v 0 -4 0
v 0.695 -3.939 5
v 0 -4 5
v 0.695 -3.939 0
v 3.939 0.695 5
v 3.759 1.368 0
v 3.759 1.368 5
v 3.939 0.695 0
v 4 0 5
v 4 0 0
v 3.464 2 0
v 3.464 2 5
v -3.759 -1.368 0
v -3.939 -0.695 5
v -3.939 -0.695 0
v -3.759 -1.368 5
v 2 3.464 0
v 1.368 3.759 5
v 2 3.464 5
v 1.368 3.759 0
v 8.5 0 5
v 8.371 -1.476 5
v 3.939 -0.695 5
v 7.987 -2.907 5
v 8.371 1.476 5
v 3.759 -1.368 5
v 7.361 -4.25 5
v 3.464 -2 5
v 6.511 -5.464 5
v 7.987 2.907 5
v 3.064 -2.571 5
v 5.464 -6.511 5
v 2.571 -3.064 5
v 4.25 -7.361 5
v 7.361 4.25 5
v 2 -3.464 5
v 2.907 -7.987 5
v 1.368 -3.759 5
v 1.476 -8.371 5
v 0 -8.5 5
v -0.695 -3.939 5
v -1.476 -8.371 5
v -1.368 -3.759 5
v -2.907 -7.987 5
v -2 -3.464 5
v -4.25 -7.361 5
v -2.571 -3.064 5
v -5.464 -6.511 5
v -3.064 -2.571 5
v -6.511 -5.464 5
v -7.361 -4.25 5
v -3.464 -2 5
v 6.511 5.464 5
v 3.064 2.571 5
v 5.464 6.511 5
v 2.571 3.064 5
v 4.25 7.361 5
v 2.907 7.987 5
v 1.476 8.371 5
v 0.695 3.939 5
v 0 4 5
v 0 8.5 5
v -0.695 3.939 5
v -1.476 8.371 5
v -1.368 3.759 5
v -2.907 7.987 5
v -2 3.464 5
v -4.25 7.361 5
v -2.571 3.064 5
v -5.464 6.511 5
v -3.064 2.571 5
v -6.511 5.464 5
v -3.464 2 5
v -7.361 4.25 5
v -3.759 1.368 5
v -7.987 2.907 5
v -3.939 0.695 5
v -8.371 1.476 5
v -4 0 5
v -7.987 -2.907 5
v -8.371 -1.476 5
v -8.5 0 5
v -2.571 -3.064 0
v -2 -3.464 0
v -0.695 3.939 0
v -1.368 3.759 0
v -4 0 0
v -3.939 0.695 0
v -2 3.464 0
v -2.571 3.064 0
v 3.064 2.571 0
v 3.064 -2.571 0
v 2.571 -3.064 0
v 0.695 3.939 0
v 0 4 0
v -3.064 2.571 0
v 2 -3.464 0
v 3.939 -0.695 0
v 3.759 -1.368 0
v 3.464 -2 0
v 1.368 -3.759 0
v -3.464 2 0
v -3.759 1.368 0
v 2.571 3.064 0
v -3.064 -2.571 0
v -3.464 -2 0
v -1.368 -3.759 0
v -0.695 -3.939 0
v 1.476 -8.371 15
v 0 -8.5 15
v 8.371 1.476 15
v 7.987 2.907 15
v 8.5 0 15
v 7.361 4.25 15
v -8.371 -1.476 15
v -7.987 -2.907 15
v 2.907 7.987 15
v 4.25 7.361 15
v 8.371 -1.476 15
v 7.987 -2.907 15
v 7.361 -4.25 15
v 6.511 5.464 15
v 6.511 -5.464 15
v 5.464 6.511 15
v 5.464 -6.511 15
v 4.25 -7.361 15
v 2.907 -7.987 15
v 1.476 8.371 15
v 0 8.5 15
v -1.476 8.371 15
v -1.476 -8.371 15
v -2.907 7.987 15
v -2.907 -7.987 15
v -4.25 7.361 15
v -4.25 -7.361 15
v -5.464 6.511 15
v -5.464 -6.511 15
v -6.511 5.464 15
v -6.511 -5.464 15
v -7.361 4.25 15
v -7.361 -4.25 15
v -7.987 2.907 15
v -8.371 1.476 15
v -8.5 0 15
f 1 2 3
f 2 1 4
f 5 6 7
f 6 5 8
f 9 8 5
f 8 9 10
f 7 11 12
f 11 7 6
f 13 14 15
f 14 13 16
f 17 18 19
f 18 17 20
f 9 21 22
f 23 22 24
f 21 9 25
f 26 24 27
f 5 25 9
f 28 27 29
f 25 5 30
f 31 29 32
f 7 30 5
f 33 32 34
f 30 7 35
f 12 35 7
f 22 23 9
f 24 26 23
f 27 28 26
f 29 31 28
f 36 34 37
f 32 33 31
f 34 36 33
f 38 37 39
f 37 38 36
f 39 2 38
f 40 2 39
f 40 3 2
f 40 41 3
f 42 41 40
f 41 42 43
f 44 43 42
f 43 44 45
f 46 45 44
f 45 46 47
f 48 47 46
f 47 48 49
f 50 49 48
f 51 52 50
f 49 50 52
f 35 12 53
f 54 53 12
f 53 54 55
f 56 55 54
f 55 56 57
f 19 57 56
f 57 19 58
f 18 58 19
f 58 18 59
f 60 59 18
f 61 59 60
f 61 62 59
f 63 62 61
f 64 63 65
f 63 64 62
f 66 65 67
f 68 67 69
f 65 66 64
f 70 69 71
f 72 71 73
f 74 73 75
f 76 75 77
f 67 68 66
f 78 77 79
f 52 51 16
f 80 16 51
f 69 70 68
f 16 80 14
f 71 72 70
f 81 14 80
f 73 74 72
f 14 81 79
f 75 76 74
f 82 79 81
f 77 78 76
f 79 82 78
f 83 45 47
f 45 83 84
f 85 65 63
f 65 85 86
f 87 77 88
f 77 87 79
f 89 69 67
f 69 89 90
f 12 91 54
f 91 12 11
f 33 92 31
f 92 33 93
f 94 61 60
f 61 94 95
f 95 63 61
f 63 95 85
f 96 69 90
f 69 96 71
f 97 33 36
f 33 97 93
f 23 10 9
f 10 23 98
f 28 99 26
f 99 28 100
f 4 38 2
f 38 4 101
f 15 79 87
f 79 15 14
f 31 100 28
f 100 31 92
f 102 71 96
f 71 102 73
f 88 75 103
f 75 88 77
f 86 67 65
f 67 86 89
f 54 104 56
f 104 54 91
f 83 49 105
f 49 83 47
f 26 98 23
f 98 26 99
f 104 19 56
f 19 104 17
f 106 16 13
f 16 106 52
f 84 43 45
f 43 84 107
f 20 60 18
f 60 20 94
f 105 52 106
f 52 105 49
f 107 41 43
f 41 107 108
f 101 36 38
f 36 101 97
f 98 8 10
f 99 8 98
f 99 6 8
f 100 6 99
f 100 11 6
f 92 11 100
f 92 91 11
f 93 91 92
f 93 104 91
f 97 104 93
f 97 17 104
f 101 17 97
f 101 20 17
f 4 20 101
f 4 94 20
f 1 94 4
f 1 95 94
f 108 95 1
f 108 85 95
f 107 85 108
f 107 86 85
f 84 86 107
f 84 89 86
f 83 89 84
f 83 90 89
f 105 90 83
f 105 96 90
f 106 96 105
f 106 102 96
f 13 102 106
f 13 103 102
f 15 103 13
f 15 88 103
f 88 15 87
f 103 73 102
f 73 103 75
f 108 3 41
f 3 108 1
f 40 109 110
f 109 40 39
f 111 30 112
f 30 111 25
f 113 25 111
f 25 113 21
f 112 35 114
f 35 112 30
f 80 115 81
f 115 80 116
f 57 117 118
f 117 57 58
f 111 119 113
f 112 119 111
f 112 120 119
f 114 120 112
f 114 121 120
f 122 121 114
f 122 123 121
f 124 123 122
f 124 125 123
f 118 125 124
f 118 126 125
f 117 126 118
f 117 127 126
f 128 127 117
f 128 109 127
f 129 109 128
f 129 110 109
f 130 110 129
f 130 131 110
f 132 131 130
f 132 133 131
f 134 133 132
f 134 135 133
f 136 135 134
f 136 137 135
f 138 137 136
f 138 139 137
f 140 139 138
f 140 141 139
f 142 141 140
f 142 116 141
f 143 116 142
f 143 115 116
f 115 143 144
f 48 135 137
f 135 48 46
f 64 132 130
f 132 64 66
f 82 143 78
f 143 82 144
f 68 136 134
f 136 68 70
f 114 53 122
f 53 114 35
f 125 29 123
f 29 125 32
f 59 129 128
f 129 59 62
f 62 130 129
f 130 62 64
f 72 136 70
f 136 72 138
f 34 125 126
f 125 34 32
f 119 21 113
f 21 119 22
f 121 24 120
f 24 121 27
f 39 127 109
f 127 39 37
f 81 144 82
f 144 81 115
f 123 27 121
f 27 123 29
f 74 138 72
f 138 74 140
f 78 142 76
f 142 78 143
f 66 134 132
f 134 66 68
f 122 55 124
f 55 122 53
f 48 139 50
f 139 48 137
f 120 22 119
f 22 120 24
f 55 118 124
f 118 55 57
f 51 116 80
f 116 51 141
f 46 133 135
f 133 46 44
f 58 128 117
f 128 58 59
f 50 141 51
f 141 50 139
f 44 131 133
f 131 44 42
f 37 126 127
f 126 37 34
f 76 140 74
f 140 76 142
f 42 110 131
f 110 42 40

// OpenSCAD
$fn=36;

//Wall Thickness
wt=2.54; //6 lines

//Durchmesser außen 19
da=25.5; //22*1,08*1.08
//Durchmesser innen
di=17;
//Länge Stange
ls=640;
//Cube
c=da+wt*2;
//breite regal
br=98;
//breite brett
bb=9;
//tiefe regal
tr=54.5;
//tiefe brett
tb=2;
//kugellager außen 8/22
dka=22;
//kugellager innen
dki=8;
//Radius Filamentrolle 11cm d=22cm
rf=110;
//Metallschiene 6 Lochdurchmesser 25,5 breit
mld=6;
//Metallschiene Breite
msb=25.5;

module stange()
{
    translate([wt,c/2,c/2])
    rotate([0,90,0])
    cylinder(h=ls,d=da);
}

//stange();

module holder()
{
    cube([c,c,c]);
}

//holder();

module cubestange()
{
    translate([wt,wt,wt+da/2])
    color("#FF0000")
    cube([ls,da,da]);
}

//cubestange();

module cutholder()
{
    difference()
    {        
        holder();
        
        cubestange();
        stange();
    }
}

//cutholder();

module downstange()
{
    translate([-c/2+wt,0,0])
    cube([c/2,c,rf+c]);
}

//downstange();

module connector()
{
    translate([0,0,rf+c/2])
    cube([c*2,c,c/2]);
}

//connector();

module metallconnectorraw()
{
    translate([0,0,-c])
    cube([wt,c,c]);
}

//metallconnectorraw();

module loch()
{
    translate([0,c/2,-c/2])
    rotate([0,90,0])
    color("#FF00FF")
    cylinder(h=wt,d=mld);
}

//loch();

module metallconnector()
{
    difference()
    {
        metallconnectorraw();
        loch();
    }
}

//metallconnector();

module bearrollingadapter()
{
    hkl=5;
    cylinder(h=hkl,d=dki);
    translate([0,0,hkl])
    cylinder(h=hkl*2,d=di);
}

bearrollingadapter();
